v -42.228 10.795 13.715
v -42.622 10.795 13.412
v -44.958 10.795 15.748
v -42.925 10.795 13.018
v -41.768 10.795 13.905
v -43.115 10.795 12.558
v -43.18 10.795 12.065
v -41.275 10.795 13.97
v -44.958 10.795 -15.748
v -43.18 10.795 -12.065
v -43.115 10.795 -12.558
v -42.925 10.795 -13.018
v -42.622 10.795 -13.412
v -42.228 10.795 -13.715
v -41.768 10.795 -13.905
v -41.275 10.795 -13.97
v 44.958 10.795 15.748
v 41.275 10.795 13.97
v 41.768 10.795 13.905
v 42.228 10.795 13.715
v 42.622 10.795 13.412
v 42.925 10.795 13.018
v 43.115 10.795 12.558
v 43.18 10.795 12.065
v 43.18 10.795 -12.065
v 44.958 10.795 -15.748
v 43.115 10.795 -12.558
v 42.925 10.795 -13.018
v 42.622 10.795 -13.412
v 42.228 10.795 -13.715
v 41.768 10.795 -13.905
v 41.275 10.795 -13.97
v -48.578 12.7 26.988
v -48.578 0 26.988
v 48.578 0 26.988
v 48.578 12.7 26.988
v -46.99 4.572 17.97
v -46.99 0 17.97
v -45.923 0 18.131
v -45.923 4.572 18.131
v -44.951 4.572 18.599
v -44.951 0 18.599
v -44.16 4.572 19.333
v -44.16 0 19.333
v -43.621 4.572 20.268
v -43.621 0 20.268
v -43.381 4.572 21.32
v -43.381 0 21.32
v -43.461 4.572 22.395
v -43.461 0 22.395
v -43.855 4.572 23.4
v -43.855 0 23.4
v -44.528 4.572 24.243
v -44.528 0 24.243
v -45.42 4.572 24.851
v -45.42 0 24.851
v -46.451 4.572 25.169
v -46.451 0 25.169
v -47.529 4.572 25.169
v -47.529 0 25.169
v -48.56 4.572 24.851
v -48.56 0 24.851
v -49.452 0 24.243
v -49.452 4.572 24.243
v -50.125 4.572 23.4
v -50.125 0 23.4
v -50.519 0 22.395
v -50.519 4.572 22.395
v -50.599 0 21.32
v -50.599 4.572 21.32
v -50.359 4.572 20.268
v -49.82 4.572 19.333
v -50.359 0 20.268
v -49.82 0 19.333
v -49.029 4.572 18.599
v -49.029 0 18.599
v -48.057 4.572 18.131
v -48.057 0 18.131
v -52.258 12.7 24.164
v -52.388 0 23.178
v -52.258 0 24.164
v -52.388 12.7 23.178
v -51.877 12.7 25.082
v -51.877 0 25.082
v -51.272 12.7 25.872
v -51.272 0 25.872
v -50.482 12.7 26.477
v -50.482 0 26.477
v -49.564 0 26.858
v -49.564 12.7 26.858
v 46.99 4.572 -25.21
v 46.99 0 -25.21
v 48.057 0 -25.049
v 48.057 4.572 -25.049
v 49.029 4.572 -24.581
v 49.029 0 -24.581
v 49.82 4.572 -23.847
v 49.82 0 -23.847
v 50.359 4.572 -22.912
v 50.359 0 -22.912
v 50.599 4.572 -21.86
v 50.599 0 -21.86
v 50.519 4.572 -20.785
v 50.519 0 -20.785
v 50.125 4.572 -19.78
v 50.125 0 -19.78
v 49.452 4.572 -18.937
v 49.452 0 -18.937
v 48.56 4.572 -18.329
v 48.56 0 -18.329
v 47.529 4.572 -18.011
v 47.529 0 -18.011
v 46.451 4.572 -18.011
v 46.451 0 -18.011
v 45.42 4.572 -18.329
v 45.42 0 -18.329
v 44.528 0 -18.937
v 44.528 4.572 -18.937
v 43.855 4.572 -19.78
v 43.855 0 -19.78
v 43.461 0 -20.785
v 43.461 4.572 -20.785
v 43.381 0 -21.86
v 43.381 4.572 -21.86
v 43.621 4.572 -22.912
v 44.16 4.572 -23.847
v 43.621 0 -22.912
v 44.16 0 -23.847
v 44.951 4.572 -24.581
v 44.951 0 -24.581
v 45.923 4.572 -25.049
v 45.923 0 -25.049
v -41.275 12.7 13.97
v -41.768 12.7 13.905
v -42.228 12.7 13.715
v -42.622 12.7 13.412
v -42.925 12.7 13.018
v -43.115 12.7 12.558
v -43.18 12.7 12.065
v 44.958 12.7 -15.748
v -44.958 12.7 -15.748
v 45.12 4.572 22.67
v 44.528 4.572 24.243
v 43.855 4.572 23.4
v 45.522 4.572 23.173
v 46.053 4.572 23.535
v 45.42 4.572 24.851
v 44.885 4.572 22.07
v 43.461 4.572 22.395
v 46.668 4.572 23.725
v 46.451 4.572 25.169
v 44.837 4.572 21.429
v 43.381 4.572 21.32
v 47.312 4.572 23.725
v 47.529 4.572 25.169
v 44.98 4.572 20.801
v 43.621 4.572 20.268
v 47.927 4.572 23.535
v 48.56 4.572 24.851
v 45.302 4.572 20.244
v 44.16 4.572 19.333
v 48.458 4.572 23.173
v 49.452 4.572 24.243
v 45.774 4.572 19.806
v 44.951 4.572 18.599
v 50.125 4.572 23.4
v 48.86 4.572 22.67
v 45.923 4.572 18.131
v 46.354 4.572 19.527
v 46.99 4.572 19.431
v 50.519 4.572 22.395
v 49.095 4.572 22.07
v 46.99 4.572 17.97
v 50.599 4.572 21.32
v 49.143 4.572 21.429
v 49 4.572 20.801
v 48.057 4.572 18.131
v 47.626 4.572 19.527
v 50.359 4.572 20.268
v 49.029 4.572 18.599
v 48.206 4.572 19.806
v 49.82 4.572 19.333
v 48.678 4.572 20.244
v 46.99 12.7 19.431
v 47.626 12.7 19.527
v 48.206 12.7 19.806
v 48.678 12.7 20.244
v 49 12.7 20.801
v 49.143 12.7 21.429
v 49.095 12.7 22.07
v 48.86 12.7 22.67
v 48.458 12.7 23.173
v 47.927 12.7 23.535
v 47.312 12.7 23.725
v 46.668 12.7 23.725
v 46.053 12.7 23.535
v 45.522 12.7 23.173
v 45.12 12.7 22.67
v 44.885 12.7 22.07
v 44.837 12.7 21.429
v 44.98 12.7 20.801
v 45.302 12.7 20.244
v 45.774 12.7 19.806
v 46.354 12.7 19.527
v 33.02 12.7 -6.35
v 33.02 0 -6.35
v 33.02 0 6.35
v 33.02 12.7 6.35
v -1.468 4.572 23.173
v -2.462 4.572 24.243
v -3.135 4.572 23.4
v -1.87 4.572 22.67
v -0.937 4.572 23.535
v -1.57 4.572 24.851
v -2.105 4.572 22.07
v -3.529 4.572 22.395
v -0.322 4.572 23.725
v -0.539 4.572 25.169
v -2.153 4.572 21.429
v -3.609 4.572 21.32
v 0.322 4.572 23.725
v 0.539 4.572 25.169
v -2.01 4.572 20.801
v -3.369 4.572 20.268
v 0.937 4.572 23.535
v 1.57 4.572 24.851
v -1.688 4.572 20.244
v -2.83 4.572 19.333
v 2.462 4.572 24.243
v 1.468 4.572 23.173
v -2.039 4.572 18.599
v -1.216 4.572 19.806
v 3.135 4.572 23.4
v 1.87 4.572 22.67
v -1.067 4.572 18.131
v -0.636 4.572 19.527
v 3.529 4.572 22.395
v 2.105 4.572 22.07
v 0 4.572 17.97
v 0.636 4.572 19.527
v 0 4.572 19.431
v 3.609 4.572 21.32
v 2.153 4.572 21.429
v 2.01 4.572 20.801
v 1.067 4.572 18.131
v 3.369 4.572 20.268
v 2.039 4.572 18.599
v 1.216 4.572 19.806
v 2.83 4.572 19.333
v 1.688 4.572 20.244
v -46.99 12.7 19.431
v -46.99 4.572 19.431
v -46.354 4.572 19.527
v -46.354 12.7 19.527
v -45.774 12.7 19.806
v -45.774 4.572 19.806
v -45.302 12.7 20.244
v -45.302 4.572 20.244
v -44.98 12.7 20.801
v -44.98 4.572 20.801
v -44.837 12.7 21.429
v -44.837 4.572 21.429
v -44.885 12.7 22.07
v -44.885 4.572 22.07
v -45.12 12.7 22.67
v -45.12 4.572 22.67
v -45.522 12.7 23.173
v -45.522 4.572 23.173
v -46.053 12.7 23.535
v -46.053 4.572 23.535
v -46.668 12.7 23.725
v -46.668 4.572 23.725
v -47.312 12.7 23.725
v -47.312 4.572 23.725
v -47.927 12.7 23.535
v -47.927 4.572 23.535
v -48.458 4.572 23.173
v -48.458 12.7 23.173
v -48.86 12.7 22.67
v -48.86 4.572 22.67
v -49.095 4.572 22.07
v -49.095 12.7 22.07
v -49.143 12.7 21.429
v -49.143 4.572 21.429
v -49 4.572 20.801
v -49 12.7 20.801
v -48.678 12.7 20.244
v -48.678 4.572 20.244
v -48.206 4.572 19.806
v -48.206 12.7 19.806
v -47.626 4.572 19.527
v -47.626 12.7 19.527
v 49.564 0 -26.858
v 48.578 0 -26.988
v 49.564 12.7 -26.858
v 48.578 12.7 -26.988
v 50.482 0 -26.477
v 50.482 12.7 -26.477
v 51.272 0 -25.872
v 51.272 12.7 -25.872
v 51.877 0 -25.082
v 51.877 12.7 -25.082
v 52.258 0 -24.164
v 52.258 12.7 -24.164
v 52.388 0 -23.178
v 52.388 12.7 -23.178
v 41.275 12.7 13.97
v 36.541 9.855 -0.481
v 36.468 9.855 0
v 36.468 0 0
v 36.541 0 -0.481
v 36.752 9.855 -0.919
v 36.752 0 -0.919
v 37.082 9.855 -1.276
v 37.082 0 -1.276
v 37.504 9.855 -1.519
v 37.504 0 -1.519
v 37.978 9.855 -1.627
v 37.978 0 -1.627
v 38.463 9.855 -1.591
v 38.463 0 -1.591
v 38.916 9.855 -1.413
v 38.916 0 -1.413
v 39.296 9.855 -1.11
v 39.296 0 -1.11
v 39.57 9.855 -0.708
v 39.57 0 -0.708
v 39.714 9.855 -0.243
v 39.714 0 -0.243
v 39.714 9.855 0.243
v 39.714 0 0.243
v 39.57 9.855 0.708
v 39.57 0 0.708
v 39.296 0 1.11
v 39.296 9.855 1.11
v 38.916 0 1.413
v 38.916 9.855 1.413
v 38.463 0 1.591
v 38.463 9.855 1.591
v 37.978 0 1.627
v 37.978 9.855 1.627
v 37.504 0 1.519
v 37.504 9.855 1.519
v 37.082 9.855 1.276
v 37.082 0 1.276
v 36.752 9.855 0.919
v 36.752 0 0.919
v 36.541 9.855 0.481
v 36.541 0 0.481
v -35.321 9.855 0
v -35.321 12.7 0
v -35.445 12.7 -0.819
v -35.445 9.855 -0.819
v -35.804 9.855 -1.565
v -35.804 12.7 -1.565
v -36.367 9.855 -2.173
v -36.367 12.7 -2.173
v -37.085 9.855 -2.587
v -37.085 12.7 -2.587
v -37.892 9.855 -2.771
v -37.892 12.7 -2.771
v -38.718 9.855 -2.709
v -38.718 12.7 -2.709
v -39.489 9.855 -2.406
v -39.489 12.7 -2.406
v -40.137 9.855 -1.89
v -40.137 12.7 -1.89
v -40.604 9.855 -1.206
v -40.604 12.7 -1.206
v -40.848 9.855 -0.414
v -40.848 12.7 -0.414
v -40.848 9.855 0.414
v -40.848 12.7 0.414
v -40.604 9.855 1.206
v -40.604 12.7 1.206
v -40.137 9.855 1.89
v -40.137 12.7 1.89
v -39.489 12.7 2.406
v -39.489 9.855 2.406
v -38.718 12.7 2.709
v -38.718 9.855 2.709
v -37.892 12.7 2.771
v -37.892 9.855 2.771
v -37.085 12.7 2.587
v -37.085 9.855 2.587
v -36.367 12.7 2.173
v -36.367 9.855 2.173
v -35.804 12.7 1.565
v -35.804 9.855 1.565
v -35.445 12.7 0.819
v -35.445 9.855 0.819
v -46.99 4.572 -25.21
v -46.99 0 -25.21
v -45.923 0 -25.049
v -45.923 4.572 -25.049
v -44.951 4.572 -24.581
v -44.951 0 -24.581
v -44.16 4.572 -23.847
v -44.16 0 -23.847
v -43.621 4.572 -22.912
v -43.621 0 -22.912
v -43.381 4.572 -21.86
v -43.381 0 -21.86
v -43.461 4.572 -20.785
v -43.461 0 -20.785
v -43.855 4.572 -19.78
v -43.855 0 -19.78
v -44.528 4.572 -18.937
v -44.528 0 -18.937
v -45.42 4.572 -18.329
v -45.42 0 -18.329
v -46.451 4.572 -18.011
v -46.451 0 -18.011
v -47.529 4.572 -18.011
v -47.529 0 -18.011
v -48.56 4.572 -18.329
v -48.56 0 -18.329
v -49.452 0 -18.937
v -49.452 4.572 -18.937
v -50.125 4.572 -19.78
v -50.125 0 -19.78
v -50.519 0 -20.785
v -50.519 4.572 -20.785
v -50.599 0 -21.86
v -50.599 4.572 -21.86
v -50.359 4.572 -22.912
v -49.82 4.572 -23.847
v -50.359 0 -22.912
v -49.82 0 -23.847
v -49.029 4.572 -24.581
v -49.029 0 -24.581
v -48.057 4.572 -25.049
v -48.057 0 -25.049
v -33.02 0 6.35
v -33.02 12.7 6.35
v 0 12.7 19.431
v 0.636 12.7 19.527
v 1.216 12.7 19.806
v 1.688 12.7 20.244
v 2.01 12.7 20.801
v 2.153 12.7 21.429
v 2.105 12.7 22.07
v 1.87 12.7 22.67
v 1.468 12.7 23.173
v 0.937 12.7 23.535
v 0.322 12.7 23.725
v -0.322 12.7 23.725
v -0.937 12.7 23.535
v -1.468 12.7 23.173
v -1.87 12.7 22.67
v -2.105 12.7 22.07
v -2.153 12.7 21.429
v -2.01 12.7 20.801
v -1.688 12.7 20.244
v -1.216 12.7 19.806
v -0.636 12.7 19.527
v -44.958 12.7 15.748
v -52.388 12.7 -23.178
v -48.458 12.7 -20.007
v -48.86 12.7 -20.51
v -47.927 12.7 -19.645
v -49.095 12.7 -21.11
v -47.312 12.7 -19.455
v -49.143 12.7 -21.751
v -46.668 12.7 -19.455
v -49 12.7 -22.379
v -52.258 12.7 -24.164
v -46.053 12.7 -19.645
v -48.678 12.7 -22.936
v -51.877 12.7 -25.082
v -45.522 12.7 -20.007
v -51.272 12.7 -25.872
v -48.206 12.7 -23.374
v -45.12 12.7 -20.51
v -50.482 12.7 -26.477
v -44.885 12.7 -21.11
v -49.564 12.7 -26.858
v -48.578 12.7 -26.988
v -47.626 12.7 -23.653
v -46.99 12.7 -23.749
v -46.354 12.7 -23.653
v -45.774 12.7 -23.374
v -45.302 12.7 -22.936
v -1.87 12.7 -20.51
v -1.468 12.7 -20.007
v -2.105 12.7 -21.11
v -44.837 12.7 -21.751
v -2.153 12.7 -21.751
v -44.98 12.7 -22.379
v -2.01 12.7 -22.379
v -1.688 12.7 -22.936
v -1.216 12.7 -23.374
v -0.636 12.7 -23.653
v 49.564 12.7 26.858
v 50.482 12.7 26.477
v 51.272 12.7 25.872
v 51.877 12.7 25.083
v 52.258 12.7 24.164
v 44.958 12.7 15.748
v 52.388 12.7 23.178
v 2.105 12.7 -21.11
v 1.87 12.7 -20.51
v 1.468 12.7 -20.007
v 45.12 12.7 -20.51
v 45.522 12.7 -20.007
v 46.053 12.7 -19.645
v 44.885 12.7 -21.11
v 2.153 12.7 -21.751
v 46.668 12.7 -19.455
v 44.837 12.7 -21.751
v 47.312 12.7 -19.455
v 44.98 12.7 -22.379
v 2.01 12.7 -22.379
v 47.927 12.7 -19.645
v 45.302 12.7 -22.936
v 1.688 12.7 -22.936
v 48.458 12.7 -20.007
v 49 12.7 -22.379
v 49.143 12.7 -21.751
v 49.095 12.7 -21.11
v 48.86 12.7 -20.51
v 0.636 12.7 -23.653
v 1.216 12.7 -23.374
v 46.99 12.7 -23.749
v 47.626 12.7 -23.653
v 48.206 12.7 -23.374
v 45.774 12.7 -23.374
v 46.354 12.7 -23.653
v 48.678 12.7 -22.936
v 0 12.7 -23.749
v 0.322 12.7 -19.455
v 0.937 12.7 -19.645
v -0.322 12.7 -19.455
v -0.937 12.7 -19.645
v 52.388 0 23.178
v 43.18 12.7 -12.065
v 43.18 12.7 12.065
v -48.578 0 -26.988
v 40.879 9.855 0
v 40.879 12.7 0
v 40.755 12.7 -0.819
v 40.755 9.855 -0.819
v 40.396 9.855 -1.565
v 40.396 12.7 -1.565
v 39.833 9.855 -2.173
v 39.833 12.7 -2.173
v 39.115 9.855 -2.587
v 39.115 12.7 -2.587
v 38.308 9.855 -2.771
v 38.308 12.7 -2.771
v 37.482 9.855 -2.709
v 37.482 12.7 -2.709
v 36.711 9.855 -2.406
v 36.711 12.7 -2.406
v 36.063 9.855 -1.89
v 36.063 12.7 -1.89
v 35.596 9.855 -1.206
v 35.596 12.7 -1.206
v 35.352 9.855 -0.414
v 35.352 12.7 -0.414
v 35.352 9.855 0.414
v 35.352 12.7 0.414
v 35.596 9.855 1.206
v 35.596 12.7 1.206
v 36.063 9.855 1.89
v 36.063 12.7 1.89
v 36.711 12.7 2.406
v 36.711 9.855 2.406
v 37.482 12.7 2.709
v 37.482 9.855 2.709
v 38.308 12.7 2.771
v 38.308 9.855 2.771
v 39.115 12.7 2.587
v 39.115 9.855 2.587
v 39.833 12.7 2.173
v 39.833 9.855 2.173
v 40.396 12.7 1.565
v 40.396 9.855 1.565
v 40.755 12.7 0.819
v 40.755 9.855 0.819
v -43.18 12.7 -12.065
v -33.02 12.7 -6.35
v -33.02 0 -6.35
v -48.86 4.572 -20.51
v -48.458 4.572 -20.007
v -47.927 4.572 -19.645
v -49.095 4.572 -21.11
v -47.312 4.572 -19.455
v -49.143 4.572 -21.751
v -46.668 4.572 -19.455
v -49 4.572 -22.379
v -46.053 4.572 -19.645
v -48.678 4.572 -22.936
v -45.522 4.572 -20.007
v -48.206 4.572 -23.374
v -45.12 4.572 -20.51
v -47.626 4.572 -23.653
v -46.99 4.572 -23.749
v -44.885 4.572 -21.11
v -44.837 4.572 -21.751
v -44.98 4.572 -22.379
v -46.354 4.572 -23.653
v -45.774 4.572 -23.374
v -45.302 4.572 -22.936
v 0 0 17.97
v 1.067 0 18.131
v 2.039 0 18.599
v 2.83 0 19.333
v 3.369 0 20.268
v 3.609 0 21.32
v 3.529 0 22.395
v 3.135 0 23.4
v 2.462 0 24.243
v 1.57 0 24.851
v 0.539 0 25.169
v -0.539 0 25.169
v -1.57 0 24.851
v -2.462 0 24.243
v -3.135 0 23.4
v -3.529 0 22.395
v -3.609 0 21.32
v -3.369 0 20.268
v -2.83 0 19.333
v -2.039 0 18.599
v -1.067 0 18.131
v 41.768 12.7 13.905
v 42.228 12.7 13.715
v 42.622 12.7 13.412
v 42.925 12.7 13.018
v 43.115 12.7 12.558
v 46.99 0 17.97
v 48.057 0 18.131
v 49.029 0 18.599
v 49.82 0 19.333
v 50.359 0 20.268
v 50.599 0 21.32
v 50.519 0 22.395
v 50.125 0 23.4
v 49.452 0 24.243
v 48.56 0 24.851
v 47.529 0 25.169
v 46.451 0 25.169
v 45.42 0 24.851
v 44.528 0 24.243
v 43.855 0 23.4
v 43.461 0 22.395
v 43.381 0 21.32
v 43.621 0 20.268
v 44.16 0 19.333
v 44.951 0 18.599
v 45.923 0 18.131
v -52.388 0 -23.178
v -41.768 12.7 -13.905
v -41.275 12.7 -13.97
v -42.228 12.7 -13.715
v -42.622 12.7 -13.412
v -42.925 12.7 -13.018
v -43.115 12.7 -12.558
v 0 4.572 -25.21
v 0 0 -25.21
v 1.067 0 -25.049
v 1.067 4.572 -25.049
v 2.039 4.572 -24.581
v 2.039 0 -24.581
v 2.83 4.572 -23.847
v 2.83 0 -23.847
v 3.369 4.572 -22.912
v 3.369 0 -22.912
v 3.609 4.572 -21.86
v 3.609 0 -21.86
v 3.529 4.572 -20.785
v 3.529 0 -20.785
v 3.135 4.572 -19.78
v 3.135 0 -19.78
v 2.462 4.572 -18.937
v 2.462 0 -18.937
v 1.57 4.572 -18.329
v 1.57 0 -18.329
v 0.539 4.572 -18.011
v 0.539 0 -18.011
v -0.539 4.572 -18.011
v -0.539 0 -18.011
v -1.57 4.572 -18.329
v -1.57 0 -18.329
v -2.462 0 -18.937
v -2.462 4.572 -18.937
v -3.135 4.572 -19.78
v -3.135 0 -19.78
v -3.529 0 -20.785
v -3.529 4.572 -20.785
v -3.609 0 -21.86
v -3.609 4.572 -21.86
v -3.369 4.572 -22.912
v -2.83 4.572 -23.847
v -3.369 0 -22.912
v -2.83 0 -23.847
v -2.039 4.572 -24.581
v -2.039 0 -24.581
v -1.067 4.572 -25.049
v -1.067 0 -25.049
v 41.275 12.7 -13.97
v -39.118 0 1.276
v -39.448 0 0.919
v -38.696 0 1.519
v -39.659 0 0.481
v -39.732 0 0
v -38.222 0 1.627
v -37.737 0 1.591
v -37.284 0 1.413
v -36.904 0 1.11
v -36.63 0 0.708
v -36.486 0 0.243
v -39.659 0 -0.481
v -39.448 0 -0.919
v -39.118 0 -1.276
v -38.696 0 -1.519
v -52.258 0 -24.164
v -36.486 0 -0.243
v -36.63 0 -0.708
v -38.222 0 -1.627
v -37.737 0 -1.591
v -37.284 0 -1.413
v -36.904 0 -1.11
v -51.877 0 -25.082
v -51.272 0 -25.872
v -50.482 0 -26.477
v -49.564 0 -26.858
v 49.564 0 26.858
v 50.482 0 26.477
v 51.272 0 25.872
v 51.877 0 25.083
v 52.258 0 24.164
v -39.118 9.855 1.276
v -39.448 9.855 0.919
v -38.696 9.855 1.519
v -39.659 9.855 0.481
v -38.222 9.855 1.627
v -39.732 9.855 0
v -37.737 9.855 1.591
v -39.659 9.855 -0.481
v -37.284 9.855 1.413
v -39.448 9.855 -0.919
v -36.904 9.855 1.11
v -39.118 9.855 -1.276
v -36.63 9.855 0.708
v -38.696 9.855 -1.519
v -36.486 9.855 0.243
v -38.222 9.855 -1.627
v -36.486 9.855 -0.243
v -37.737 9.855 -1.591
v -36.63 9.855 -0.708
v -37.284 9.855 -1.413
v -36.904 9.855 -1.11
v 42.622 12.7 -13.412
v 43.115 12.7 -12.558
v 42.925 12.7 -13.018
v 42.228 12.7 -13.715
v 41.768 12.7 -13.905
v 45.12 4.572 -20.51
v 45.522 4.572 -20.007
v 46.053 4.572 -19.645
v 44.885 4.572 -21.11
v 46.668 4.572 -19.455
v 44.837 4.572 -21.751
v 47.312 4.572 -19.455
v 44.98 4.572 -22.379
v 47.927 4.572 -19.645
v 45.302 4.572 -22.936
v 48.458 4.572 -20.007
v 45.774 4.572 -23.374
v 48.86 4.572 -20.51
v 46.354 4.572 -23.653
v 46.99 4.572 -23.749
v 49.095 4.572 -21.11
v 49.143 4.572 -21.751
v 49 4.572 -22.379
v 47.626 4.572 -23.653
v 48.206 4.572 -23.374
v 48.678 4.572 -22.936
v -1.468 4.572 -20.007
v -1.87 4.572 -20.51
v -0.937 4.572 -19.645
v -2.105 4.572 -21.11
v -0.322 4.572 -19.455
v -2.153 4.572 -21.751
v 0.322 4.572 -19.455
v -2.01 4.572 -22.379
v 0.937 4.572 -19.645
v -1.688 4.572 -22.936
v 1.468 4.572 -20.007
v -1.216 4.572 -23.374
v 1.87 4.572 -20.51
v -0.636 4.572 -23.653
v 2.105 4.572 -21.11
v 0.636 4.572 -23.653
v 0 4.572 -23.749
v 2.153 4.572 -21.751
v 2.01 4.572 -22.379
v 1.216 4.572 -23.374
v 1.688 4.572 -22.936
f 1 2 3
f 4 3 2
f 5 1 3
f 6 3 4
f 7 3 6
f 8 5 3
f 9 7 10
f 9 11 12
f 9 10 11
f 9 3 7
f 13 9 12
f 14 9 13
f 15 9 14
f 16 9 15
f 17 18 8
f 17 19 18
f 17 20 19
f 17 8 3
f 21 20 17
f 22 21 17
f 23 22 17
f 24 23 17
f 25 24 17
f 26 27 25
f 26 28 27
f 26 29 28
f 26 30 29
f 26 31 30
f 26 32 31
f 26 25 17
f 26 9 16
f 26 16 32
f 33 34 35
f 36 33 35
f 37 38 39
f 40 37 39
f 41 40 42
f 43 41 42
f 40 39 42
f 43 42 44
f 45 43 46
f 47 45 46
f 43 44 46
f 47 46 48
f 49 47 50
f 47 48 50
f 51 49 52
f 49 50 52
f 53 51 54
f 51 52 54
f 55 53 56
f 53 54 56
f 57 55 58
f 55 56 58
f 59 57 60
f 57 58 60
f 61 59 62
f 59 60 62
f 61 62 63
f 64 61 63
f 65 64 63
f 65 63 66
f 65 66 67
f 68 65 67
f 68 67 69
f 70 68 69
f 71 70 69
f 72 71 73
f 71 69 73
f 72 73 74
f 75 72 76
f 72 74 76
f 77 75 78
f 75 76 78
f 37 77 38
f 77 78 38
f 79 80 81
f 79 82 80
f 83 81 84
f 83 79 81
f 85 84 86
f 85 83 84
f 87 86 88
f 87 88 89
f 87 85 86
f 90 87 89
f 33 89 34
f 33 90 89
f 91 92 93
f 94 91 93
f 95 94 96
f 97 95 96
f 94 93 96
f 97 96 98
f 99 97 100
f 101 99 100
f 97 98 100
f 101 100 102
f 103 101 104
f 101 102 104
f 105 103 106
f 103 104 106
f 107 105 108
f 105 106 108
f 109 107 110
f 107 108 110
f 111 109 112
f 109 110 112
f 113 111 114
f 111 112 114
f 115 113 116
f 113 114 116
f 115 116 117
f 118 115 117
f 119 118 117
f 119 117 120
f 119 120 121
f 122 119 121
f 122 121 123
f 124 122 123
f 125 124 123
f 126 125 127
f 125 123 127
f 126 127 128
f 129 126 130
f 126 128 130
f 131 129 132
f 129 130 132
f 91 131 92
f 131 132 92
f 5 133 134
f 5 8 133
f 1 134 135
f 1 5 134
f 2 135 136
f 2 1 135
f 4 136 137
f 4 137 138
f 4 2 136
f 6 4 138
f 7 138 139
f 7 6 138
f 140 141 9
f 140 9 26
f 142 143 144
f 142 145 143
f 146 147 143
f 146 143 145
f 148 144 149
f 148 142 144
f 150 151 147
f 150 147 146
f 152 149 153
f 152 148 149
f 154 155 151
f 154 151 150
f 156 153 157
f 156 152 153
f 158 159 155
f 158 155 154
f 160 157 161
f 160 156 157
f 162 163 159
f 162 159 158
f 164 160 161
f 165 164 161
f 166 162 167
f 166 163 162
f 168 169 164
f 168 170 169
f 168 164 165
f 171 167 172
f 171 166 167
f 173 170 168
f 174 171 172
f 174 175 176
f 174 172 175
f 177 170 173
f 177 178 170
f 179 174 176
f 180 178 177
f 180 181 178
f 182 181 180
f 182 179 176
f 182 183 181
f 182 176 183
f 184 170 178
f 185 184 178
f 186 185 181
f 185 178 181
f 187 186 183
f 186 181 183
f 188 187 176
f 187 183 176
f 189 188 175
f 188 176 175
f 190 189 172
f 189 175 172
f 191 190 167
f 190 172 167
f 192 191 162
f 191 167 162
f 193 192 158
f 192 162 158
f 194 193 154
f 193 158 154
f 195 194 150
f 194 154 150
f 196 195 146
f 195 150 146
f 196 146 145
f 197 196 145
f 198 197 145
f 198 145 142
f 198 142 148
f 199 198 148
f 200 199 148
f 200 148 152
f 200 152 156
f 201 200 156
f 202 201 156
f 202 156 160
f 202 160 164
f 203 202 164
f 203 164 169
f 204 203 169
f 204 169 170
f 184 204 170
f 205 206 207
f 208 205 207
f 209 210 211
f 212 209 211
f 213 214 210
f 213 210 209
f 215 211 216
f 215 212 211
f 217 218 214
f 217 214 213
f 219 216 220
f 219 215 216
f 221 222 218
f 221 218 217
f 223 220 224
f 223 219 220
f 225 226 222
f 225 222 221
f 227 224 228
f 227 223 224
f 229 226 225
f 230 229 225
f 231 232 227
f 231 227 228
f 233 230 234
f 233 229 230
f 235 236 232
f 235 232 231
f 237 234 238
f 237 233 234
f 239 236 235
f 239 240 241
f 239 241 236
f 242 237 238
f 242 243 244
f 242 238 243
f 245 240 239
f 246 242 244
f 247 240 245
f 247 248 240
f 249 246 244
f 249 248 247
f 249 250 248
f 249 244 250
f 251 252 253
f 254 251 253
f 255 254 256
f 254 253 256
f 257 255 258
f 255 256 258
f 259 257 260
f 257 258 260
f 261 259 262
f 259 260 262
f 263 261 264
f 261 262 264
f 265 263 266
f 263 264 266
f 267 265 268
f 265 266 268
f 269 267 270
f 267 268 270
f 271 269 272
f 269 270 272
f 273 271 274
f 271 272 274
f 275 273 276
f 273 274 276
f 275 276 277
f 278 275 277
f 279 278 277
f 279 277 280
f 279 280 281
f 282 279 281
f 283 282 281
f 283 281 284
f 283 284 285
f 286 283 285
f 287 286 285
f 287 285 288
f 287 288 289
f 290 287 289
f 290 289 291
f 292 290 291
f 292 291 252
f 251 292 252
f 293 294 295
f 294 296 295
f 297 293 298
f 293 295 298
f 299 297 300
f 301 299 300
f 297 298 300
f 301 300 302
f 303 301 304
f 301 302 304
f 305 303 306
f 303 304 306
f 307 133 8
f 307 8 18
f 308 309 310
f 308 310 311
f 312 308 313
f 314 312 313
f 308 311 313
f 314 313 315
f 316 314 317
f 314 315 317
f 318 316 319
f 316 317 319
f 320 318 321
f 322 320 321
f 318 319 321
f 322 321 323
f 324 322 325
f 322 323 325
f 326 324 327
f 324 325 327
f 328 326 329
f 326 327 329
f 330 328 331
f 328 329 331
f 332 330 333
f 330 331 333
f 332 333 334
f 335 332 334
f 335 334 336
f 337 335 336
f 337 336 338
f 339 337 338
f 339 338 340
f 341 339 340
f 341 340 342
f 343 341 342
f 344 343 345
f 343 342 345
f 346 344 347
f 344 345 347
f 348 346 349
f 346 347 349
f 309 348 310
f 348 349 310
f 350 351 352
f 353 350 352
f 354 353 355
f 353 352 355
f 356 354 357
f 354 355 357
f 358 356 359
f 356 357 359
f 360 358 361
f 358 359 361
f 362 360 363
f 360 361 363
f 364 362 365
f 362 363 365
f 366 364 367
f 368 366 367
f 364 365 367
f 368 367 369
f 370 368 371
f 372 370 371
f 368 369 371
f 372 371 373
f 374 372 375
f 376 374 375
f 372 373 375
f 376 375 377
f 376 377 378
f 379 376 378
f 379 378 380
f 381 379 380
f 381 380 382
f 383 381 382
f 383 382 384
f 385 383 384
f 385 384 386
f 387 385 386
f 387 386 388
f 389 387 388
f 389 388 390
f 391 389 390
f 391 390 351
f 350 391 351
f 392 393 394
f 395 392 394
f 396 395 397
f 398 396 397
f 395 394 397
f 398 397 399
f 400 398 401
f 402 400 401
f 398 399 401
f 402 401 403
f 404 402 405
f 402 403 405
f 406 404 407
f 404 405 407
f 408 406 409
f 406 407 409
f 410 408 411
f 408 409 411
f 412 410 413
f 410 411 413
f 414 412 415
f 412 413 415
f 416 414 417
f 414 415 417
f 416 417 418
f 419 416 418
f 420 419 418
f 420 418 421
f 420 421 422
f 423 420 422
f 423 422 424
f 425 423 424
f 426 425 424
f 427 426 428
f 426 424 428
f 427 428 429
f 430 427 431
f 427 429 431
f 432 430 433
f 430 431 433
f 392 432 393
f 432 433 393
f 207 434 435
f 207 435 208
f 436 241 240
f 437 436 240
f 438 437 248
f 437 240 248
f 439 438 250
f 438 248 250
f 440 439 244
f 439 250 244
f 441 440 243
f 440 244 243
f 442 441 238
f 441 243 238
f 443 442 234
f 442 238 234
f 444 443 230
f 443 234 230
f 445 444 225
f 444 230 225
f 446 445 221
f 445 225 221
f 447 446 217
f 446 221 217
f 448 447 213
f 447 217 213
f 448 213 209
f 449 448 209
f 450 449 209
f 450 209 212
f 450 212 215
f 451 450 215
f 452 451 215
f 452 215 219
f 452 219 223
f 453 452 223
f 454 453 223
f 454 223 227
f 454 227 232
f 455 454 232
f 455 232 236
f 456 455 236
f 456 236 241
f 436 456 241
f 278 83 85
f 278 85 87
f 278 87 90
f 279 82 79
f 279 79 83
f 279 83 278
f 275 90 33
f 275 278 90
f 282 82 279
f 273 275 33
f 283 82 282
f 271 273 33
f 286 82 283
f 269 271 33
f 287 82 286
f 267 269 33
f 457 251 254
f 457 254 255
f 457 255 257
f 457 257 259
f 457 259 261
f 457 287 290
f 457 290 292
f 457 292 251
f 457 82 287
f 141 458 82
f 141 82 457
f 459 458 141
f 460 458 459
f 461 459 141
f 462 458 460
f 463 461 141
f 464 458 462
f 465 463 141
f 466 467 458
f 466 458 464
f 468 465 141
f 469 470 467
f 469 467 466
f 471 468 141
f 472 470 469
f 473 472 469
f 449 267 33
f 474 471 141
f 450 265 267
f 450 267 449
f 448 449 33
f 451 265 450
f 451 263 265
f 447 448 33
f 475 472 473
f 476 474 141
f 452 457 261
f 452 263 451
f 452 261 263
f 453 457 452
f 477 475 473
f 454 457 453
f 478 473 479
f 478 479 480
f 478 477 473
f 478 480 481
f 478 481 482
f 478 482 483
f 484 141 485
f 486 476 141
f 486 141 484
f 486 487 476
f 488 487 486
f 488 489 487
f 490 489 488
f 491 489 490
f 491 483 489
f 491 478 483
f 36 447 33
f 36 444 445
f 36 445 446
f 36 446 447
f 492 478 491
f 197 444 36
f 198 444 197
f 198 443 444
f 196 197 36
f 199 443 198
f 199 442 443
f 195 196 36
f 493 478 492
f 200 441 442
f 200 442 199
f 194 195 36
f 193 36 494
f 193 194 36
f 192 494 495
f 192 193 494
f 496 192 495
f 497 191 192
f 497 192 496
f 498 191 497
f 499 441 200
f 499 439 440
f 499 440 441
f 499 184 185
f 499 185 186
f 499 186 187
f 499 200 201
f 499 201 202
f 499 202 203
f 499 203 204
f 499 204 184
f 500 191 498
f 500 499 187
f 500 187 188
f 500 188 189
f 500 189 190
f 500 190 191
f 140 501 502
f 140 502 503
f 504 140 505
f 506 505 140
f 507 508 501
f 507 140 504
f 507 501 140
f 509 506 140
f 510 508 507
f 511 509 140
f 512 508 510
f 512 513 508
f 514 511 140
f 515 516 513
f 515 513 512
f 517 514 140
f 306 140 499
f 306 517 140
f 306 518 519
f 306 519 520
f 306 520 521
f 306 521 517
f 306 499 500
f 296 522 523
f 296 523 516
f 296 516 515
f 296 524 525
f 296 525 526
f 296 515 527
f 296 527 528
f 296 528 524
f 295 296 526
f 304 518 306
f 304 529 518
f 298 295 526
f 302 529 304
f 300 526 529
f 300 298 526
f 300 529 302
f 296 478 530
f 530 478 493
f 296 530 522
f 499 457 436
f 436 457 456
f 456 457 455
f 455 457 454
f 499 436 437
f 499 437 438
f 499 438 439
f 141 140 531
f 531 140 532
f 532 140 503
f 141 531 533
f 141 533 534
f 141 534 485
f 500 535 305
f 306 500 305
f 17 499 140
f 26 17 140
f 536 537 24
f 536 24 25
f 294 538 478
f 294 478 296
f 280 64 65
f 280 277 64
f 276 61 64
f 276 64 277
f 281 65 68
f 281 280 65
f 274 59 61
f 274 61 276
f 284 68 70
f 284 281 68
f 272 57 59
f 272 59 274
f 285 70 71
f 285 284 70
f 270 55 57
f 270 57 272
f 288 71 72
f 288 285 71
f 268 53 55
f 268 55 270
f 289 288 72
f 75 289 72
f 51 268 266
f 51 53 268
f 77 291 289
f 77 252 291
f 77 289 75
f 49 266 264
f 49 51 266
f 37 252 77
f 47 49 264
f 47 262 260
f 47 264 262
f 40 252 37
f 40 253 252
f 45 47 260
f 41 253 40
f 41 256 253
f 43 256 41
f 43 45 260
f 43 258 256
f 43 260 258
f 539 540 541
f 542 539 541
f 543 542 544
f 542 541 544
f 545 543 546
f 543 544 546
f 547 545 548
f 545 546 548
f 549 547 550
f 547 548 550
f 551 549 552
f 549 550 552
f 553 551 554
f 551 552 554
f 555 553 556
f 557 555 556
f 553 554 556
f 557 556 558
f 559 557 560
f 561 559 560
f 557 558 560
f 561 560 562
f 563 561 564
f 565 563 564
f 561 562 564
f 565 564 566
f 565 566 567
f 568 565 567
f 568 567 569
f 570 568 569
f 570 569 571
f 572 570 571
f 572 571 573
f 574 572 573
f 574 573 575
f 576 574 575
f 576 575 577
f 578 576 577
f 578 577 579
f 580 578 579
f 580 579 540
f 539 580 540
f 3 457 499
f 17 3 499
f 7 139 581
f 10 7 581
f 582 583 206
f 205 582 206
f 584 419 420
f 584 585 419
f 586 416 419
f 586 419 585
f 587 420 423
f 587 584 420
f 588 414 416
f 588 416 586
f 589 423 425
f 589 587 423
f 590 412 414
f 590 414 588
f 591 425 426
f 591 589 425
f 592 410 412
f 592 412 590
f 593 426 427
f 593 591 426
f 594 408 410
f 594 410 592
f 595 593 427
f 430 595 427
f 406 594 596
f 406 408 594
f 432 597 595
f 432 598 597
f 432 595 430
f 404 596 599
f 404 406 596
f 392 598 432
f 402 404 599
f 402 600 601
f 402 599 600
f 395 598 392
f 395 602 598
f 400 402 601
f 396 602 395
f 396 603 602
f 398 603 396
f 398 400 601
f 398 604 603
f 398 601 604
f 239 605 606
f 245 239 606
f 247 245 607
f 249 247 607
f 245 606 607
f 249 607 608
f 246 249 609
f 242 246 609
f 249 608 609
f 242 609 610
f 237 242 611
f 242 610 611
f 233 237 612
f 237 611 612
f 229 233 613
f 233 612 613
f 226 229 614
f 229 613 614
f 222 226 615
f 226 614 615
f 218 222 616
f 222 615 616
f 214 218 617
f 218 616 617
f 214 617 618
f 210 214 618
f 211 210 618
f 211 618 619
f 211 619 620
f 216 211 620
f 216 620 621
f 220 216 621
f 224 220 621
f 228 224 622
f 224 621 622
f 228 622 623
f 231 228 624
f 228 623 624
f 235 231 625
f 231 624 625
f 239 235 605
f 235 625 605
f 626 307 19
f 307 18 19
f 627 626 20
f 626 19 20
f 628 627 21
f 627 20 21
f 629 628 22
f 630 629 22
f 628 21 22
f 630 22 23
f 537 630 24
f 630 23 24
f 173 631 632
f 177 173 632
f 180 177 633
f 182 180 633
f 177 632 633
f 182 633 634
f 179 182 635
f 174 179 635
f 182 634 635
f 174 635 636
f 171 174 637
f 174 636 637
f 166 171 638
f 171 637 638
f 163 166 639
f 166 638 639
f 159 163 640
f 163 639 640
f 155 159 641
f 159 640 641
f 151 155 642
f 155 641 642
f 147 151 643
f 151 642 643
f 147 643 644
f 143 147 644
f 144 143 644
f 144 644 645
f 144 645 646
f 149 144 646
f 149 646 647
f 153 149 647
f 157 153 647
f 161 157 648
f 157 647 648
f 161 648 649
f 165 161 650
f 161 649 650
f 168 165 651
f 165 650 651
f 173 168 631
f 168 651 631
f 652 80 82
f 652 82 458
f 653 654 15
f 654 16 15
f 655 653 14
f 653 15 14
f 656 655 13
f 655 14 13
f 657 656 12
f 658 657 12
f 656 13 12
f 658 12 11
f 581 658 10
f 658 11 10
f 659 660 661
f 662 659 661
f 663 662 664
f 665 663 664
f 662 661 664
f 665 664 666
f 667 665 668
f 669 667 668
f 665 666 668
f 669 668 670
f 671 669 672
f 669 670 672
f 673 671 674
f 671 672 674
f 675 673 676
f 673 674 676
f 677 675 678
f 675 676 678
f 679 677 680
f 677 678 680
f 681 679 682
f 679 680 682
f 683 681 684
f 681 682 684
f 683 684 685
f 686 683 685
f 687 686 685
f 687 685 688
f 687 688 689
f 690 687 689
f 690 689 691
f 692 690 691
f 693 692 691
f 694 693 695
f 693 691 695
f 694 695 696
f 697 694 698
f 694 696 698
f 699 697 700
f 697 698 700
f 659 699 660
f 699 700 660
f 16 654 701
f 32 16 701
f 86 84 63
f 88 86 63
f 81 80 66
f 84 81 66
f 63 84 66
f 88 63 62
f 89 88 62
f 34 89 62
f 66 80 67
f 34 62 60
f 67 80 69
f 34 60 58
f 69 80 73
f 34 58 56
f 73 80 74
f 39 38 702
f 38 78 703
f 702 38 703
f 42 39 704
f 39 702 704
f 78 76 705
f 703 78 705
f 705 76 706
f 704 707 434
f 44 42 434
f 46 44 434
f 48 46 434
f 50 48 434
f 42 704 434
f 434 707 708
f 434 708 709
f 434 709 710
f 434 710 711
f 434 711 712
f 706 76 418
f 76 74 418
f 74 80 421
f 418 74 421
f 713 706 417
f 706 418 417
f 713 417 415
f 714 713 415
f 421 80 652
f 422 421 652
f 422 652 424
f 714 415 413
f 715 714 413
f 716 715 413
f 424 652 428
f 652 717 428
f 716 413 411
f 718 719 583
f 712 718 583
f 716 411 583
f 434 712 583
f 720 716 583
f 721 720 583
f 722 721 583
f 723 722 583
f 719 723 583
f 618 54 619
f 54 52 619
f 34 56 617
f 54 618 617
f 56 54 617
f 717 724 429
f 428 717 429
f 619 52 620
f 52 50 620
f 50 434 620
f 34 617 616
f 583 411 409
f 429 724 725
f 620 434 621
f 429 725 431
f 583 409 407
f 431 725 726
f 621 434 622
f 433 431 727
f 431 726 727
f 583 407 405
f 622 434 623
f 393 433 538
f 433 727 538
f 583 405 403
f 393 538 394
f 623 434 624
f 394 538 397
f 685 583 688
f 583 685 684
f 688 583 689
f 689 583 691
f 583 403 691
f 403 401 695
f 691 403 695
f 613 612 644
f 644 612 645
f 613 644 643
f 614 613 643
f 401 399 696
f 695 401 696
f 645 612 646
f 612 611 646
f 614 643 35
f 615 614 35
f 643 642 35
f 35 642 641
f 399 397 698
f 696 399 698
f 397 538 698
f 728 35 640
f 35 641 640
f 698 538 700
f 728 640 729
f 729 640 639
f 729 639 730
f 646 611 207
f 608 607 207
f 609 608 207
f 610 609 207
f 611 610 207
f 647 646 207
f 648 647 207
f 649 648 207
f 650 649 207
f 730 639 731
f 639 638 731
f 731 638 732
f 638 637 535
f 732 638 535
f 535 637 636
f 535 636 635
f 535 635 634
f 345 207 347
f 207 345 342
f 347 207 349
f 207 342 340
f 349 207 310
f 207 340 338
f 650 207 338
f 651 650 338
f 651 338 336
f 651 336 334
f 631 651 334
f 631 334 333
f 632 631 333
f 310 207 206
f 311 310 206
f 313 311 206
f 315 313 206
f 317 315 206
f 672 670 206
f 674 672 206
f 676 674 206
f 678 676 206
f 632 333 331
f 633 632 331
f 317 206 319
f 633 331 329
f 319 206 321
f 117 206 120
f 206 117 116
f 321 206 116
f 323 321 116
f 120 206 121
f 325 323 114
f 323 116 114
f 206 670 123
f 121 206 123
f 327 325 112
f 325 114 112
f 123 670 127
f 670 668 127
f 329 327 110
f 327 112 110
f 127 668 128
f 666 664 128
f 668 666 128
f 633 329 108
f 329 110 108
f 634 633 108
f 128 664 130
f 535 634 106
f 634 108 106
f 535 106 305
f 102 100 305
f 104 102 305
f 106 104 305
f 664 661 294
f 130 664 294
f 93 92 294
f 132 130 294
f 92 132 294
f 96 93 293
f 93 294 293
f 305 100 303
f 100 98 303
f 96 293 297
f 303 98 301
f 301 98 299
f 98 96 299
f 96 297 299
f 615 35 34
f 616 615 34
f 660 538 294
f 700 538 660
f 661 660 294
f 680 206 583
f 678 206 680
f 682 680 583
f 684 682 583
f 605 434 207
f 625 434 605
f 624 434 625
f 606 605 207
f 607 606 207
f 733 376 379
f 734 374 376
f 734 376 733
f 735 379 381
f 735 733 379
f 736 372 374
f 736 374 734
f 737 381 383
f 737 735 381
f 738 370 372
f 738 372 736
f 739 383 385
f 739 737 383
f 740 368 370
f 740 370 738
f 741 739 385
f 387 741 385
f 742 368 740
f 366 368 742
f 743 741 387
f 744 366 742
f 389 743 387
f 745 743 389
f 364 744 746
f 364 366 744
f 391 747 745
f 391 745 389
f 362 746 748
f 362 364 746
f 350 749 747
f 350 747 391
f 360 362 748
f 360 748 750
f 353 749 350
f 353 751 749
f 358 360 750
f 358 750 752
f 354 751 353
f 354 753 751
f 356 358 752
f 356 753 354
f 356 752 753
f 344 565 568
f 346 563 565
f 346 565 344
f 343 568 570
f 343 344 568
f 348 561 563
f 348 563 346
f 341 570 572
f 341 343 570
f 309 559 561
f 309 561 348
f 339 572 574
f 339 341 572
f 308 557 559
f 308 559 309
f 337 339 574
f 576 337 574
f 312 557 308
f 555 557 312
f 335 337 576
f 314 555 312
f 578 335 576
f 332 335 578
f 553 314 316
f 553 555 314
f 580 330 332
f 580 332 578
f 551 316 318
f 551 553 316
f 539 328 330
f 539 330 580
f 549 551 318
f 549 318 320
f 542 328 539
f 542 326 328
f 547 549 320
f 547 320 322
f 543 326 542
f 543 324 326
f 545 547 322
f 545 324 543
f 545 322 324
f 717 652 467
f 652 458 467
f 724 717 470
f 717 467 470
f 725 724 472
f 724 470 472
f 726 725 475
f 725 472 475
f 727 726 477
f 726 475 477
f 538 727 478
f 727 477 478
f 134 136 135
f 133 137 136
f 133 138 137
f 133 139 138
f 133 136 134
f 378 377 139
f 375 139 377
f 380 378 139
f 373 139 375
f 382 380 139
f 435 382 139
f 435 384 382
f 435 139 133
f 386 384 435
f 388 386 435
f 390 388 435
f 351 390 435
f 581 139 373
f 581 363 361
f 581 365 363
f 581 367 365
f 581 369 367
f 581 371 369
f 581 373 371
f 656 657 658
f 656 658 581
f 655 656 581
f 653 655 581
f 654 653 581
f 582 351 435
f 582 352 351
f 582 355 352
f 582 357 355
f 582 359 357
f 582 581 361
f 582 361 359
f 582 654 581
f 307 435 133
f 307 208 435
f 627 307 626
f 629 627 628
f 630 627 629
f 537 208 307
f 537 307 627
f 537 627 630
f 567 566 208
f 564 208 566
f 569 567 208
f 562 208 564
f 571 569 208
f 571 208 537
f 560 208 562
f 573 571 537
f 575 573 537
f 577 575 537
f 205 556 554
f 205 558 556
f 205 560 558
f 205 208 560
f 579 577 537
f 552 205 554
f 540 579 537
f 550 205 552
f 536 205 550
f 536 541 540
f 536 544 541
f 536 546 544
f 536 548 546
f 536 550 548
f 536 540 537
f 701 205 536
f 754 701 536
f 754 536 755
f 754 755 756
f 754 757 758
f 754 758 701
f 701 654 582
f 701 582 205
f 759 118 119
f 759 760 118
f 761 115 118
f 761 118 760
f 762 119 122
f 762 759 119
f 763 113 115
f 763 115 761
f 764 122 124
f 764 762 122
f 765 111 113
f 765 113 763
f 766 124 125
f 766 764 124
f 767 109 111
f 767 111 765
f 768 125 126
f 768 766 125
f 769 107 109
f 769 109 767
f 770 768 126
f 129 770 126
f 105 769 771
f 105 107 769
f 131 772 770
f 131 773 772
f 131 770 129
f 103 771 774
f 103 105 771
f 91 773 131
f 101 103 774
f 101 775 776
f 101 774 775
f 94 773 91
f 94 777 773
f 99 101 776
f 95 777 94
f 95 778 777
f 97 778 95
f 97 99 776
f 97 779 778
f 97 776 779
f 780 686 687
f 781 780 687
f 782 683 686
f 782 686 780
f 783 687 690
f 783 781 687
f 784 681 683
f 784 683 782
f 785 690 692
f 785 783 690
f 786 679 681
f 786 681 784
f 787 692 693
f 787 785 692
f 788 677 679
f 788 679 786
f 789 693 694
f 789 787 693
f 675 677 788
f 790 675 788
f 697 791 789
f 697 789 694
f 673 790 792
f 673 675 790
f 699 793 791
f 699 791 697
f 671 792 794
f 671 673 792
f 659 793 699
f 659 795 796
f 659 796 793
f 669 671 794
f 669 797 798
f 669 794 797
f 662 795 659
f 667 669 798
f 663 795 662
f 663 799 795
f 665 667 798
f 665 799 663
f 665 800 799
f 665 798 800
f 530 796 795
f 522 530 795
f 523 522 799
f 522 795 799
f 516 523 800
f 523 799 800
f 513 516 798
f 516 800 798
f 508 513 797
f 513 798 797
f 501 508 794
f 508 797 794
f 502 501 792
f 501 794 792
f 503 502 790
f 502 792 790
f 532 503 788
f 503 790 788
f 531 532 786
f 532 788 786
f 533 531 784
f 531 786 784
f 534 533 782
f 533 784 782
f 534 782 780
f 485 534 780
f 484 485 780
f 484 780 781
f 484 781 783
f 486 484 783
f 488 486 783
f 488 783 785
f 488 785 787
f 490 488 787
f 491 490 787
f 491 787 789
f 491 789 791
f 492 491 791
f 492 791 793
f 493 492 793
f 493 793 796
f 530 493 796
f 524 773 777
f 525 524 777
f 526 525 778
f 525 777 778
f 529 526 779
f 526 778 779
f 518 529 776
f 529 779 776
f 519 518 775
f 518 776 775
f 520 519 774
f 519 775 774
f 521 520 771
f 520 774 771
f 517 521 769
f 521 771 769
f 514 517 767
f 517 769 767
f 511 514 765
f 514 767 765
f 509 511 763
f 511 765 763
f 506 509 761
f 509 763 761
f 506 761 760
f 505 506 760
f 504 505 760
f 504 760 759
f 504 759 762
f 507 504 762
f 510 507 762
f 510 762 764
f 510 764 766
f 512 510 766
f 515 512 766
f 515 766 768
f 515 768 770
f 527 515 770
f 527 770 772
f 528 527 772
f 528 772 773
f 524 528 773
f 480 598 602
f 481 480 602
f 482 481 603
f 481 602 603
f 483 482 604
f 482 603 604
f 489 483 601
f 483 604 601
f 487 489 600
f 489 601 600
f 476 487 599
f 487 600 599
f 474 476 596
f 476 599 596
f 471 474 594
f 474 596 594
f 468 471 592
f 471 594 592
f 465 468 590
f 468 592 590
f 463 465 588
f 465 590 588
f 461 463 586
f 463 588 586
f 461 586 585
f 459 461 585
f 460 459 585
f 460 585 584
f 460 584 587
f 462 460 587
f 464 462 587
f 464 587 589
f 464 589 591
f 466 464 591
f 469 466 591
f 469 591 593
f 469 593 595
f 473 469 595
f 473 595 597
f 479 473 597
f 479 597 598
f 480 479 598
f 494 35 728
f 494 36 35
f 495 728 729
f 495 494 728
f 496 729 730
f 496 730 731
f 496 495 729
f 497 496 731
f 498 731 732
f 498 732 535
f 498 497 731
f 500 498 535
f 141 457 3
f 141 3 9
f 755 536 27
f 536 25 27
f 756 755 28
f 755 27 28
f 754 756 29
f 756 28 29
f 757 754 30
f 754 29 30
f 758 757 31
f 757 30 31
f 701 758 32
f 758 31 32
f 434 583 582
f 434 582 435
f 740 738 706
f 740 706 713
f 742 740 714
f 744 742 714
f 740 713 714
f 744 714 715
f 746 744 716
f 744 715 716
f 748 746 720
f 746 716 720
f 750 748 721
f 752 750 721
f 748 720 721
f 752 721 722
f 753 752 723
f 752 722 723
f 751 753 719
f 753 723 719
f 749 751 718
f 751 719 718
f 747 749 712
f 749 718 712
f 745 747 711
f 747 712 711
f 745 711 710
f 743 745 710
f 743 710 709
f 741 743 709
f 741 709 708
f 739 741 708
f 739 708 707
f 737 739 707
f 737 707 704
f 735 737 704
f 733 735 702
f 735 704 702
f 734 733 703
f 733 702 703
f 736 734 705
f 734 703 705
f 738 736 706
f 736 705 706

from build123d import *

# Parameters (mm, degrees)
SKETCH1_W                                      = 104.775
SKETCH1_H                                      = 53.975
BOSS_EXTRUDE1_DEPTH                            = 12.7
SKETCH3_W                                      = 89.916
SKETCH3_H                                      = 31.496
SKETCH3_W_2                                    = 86.36
SKETCH3_H_2                                    = 27.94
CUT_EXTRUDE1_DEPTH                             = 1.905
FILLET1_R                                      = 1.905
SKETCH4_R                                      = 2.159
CUT_EXTRUDE2_DEPTH                             = 61.283209209
SKETCH8_R                                      = 3.6195
CUT_EXTRUDE3_DEPTH                             = 4.572
FILLET2_R                                      = 3.81
SKETCH13_W                                     = 66.04
SKETCH13_H                                     = 12.7
CUT_EXTRUDE4_DEPTH                             = 61.283209209
CBORE_FOR_4_SOCKET_HEAD_CAP_SCREW3_D           = 3.2639
CBORE_FOR_4_SOCKET_HEAD_CAP_SCREW3_CBORE_D     = 5.55752
CBORE_FOR_4_SOCKET_HEAD_CAP_SCREW3_CBORE_DEPTH = 2.8448


with BuildPart() as part:
    # Sketch1 → Boss-Extrude1 (new body)
    with BuildSketch(Plane(origin=(0, 0, 0), x_dir=(1, 0, 0), z_dir=(0, 1, 0))):
        Rectangle(SKETCH1_W, SKETCH1_H)
    extrude(amount=BOSS_EXTRUDE1_DEPTH)

    # Sketch3 → Cut-Extrude1 (cut)
    with BuildSketch(Plane(origin=(0, 12.7, 0), x_dir=(1, 0, 0), z_dir=(0, 1, 0))):
        Rectangle(SKETCH3_W, SKETCH3_H)
        Rectangle(SKETCH3_W_2, SKETCH3_H_2, mode=Mode.SUBTRACT)
    extrude(amount=-CUT_EXTRUDE1_DEPTH, mode=Mode.SUBTRACT)

    # Fillet1
    fillet1_edges = [part.edges().sort_by_distance(p)[0] for p in [
        (43.18, 11.7475, 13.97),
        (-43.18, 11.7475, 13.97),
        (-43.18, 11.7475, -13.97),
        (43.18, 11.7475, -13.97),
    ]]
    fillet(fillet1_edges, radius=FILLET1_R)

    # Sketch4 → Cut-Extrude2 (cut, through all)
    with BuildSketch(Plane.XZ):
        with Locations(Location((-46.99, 21.59, 0), (0, 0, 270))):
            Circle(SKETCH4_R)
        with Locations(Location((46.99, 21.59, 0), (0, 0, 270))):
            Circle(SKETCH4_R)
        with Locations(Location((-46.99, -21.59, 0), (0, 0, 270))):
            Circle(SKETCH4_R)
        with Locations(Location((46.99, -21.59, 0), (0, 0, 270))):
            Circle(SKETCH4_R)
        with Locations(Location((0, 21.59, 0), (0, 0, 270))):
            Circle(SKETCH4_R)
        with Locations(Location((0, -21.59, 0), (0, 0, 270))):
            Circle(SKETCH4_R)
    extrude(amount=-CUT_EXTRUDE2_DEPTH, mode=Mode.SUBTRACT)

    # Sketch8 → Cut-Extrude3 (cut)
    with BuildSketch(Plane.XZ):
        with Locations(Location((-46.99, 21.59, 0), (0, 0, 270))):
            Circle(SKETCH8_R)
        with Locations(Location((0, 21.59, 0), (0, 0, 270))):
            Circle(SKETCH8_R)
        with Locations(Location((46.99, 21.59, 0), (0, 0, 270))):
            Circle(SKETCH8_R)
        with Locations(Location((46.99, -21.59, 0), (0, 0, 270))):
            Circle(SKETCH8_R)
        with Locations(Location((0, -21.59, 0), (0, 0, 270))):
            Circle(SKETCH8_R)
        with Locations(Location((-46.99, -21.59, 0), (0, 0, 270))):
            Circle(SKETCH8_R)
    extrude(amount=-CUT_EXTRUDE3_DEPTH, mode=Mode.SUBTRACT)

    # Fillet2
    fillet2_edges = [part.edges().sort_by_distance(p)[0] for p in [
        (52.3875, 6.35, 26.9875),
        (-52.3875, 6.35, 26.9875),
        (-52.3875, 6.35, -26.9875),
        (52.3875, 6.35, -26.9875),
    ]]
    fillet(fillet2_edges, radius=FILLET2_R)

    # Sketch13 → Cut-Extrude4 (cut, through all)
    with BuildSketch(Plane.XZ):
        Rectangle(SKETCH13_W, SKETCH13_H)
    extrude(amount=-CUT_EXTRUDE4_DEPTH, mode=Mode.SUBTRACT)

    # CBORE for #4 Socket Head Cap Screw3 (through all)
    with Locations(Plane(origin=(0, 12.7, 0), x_dir=(1, 0, 0), z_dir=(0, 1, 0))):
        with Locations((-38.1, 0), (38.1, 0)):
            CounterBoreHole(CBORE_FOR_4_SOCKET_HEAD_CAP_SCREW3_D / 2, CBORE_FOR_4_SOCKET_HEAD_CAP_SCREW3_CBORE_D / 2, CBORE_FOR_4_SOCKET_HEAD_CAP_SCREW3_CBORE_DEPTH)


solid = part.part
